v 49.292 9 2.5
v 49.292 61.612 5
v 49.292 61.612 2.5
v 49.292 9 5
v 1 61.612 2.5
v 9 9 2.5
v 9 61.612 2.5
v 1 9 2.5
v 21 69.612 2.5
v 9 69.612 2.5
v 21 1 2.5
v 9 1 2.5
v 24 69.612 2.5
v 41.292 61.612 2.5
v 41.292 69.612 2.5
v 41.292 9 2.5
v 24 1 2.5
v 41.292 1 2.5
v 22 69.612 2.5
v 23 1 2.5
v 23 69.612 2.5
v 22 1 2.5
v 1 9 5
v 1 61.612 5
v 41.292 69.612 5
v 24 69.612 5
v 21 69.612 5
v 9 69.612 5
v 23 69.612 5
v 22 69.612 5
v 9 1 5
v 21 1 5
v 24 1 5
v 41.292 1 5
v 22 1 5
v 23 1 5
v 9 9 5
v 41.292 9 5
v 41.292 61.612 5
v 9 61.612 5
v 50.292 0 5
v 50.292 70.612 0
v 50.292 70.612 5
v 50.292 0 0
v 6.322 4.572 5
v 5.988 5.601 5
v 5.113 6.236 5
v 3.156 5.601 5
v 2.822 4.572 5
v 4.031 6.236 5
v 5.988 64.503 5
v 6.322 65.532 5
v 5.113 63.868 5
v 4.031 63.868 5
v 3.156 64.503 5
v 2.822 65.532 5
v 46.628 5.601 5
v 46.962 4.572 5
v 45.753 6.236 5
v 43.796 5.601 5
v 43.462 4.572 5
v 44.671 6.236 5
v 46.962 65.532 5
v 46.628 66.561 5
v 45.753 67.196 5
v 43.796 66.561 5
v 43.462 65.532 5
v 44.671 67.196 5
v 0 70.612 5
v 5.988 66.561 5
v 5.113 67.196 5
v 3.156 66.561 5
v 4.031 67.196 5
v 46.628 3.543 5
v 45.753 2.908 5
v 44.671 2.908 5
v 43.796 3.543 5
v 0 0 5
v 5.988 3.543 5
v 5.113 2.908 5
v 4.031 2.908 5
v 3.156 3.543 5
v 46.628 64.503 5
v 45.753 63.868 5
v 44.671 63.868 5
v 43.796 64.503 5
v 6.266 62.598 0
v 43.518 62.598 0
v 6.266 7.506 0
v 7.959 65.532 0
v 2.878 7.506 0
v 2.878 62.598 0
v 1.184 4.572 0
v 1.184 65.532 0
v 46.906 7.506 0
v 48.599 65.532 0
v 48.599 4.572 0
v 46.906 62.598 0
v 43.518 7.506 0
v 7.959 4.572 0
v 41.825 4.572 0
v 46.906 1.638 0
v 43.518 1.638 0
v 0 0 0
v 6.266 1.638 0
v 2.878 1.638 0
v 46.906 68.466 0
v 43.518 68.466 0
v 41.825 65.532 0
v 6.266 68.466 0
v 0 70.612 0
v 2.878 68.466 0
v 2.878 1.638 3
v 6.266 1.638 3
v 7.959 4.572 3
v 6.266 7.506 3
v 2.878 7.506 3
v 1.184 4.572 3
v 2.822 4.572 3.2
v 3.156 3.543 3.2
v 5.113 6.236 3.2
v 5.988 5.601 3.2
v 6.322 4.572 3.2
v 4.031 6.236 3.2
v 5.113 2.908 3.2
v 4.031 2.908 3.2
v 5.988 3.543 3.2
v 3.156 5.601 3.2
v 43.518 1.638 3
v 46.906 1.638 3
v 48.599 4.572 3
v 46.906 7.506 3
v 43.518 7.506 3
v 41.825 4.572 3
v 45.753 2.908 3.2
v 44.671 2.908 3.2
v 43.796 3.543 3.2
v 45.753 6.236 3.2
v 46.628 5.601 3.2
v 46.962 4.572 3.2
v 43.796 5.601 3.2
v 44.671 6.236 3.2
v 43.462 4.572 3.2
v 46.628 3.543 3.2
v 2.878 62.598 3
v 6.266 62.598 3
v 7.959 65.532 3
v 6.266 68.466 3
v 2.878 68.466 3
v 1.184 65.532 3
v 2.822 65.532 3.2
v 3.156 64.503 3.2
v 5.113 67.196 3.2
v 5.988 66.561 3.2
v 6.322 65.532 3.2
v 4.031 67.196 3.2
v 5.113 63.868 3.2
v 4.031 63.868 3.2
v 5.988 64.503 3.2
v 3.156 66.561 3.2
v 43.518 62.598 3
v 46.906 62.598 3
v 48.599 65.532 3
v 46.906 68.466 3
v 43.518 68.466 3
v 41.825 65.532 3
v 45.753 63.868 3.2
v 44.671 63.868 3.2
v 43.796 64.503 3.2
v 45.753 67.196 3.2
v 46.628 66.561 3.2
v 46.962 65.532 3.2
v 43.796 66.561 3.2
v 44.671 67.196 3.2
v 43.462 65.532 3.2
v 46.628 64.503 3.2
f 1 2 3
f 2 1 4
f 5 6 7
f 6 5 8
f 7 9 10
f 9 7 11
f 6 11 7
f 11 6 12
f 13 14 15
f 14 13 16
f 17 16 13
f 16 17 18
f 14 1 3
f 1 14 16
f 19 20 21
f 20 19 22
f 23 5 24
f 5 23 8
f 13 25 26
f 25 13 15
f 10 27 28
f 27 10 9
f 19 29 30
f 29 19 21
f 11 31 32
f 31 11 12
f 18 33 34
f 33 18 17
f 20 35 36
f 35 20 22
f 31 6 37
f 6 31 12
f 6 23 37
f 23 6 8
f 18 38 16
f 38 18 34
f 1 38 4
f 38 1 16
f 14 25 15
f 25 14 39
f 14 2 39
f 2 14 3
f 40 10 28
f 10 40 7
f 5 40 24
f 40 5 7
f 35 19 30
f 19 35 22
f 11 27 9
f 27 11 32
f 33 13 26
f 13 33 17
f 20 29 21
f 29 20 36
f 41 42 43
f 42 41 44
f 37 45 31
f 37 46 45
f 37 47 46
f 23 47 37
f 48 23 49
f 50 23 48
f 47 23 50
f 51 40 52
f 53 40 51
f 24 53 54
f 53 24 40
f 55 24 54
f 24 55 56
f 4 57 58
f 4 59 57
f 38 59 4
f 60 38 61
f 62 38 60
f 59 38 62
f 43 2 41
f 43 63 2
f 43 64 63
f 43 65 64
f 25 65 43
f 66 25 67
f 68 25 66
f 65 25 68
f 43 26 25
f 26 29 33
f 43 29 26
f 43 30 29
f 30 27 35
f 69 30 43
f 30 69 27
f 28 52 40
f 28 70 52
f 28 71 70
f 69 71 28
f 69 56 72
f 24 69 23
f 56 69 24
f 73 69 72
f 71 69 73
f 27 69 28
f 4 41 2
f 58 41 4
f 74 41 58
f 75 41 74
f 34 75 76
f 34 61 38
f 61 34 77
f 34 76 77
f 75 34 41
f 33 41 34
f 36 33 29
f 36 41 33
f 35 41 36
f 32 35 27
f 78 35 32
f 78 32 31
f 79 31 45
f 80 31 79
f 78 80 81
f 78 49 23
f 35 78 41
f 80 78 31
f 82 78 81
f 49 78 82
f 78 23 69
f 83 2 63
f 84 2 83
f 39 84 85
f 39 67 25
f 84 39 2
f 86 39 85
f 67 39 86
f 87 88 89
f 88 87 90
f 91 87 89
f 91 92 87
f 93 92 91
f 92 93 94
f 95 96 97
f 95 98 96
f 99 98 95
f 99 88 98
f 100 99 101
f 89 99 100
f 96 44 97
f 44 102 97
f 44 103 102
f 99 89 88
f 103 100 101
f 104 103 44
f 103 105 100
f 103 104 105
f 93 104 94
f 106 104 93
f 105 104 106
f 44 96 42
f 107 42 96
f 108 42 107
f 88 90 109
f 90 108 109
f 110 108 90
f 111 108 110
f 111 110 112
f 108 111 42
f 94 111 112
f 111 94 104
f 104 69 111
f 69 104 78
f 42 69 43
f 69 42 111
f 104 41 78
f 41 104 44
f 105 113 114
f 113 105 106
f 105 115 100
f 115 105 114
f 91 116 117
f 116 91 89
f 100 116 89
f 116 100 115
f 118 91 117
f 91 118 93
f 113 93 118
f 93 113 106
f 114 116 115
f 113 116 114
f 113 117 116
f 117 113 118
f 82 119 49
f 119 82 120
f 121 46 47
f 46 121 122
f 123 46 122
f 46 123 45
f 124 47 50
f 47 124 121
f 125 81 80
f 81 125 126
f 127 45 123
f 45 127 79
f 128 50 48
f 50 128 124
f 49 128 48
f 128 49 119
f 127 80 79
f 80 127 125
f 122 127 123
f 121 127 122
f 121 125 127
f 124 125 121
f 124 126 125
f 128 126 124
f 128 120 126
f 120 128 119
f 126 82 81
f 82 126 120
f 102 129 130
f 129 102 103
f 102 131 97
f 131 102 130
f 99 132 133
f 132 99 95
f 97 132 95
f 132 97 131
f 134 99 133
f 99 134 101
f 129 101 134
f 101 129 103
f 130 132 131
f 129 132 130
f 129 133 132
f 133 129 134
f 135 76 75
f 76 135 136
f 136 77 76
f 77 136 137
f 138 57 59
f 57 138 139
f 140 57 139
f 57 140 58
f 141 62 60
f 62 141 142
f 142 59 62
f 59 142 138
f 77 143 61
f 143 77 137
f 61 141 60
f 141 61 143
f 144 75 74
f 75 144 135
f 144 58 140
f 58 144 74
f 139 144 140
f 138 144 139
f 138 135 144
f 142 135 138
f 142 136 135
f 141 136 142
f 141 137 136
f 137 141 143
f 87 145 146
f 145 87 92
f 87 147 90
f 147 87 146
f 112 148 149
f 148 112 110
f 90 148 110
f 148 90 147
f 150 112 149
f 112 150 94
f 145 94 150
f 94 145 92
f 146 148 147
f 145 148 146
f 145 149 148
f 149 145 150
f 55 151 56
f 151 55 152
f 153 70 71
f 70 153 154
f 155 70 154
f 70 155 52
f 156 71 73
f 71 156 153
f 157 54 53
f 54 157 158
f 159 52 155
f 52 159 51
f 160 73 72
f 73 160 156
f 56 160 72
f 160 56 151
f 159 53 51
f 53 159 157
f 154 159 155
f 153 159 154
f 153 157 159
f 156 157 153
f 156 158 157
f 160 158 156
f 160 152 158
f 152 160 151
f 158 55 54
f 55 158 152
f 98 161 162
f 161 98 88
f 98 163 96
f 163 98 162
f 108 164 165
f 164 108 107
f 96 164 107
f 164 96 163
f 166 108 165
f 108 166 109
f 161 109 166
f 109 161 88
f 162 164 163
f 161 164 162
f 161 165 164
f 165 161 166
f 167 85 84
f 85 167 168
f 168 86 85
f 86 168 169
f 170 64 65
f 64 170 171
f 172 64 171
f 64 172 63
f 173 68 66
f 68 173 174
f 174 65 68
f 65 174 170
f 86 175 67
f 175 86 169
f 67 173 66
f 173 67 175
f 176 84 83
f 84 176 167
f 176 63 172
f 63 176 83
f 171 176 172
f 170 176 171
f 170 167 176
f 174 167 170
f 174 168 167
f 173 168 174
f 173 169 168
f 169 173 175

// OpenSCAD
pedestal_height = 5;   // designed for use the MLAB standard 12mm screws.
mount_hole = 3.5;
clear = 0.175;
nut_size = 6.6;


difference () {
	cube([50.292,70.612,pedestal_height]);

	translate ([1, 1,2.5])
	difference(){
		cube([48.292,68.612,pedestal_height]);

		cube([8,8,pedestal_height]);

   		translate ([48.292 - 8, 0, 0])
		cube([8,8,pedestal_height]);

   		translate ([48.292 - 8, 68.612 - 8, 0])
		cube([8,8,pedestal_height]);

   		translate ([0, 68.612 - 8, 0])
		cube([8,8,pedestal_height]);
               
                //insulating wall
   		translate ([20, 0, 0])
		cube([1,70,pedestal_height]);
   		translate ([22, 0, 0])
		cube([1,70,pedestal_height]);
            
	}

        ////////////////////////////////////////

// MLAB grid holes

   translate ([4.572, 4.572,0])
   cylinder (h = 3, r= (nut_size+clear)/2, $fn=6);
   translate ([4.572, 4.572, 3.2])  // one solid layer for slicer (the holes will be pierced on demand )
   cylinder (h = pedestal_height, r= mount_hole/2, $fn=10);

   translate ([4.572 + 4*10.16, 4.572,0])
   cylinder (h = 3, r= (nut_size+clear)/2, $fn=6);
   translate ([4.572 + 4*10.16, 4.572, 3.2])  // one solid layer for slicer (the holes will be pierced on demand )
   cylinder (h = pedestal_height, r= mount_hole/2, $fn=10);


   translate ([4.572, 4.572 + 6*10.16, 0])
   cylinder (h = 3, r= (nut_size+clear)/2, $fn=6);
   translate ([4.572, 4.572 + 6*10.16, 3.2])  // one solid layer for slicer (the holes will be pierced on demand )
   cylinder (h = pedestal_height, r= mount_hole/2, $fn=10);

   translate ([4.572 + 4*10.16, 4.572 + 6*10.16, 0])
   cylinder (h = 3, r= (nut_size+clear)/2, $fn=6);
   translate ([4.572 + 4*10.16, 4.572 + 6*10.16, 3.2])  // one solid layer for slicer (the holes will be pierced on demand )
   cylinder (h = pedestal_height, r= mount_hole/2, $fn=10);

}
